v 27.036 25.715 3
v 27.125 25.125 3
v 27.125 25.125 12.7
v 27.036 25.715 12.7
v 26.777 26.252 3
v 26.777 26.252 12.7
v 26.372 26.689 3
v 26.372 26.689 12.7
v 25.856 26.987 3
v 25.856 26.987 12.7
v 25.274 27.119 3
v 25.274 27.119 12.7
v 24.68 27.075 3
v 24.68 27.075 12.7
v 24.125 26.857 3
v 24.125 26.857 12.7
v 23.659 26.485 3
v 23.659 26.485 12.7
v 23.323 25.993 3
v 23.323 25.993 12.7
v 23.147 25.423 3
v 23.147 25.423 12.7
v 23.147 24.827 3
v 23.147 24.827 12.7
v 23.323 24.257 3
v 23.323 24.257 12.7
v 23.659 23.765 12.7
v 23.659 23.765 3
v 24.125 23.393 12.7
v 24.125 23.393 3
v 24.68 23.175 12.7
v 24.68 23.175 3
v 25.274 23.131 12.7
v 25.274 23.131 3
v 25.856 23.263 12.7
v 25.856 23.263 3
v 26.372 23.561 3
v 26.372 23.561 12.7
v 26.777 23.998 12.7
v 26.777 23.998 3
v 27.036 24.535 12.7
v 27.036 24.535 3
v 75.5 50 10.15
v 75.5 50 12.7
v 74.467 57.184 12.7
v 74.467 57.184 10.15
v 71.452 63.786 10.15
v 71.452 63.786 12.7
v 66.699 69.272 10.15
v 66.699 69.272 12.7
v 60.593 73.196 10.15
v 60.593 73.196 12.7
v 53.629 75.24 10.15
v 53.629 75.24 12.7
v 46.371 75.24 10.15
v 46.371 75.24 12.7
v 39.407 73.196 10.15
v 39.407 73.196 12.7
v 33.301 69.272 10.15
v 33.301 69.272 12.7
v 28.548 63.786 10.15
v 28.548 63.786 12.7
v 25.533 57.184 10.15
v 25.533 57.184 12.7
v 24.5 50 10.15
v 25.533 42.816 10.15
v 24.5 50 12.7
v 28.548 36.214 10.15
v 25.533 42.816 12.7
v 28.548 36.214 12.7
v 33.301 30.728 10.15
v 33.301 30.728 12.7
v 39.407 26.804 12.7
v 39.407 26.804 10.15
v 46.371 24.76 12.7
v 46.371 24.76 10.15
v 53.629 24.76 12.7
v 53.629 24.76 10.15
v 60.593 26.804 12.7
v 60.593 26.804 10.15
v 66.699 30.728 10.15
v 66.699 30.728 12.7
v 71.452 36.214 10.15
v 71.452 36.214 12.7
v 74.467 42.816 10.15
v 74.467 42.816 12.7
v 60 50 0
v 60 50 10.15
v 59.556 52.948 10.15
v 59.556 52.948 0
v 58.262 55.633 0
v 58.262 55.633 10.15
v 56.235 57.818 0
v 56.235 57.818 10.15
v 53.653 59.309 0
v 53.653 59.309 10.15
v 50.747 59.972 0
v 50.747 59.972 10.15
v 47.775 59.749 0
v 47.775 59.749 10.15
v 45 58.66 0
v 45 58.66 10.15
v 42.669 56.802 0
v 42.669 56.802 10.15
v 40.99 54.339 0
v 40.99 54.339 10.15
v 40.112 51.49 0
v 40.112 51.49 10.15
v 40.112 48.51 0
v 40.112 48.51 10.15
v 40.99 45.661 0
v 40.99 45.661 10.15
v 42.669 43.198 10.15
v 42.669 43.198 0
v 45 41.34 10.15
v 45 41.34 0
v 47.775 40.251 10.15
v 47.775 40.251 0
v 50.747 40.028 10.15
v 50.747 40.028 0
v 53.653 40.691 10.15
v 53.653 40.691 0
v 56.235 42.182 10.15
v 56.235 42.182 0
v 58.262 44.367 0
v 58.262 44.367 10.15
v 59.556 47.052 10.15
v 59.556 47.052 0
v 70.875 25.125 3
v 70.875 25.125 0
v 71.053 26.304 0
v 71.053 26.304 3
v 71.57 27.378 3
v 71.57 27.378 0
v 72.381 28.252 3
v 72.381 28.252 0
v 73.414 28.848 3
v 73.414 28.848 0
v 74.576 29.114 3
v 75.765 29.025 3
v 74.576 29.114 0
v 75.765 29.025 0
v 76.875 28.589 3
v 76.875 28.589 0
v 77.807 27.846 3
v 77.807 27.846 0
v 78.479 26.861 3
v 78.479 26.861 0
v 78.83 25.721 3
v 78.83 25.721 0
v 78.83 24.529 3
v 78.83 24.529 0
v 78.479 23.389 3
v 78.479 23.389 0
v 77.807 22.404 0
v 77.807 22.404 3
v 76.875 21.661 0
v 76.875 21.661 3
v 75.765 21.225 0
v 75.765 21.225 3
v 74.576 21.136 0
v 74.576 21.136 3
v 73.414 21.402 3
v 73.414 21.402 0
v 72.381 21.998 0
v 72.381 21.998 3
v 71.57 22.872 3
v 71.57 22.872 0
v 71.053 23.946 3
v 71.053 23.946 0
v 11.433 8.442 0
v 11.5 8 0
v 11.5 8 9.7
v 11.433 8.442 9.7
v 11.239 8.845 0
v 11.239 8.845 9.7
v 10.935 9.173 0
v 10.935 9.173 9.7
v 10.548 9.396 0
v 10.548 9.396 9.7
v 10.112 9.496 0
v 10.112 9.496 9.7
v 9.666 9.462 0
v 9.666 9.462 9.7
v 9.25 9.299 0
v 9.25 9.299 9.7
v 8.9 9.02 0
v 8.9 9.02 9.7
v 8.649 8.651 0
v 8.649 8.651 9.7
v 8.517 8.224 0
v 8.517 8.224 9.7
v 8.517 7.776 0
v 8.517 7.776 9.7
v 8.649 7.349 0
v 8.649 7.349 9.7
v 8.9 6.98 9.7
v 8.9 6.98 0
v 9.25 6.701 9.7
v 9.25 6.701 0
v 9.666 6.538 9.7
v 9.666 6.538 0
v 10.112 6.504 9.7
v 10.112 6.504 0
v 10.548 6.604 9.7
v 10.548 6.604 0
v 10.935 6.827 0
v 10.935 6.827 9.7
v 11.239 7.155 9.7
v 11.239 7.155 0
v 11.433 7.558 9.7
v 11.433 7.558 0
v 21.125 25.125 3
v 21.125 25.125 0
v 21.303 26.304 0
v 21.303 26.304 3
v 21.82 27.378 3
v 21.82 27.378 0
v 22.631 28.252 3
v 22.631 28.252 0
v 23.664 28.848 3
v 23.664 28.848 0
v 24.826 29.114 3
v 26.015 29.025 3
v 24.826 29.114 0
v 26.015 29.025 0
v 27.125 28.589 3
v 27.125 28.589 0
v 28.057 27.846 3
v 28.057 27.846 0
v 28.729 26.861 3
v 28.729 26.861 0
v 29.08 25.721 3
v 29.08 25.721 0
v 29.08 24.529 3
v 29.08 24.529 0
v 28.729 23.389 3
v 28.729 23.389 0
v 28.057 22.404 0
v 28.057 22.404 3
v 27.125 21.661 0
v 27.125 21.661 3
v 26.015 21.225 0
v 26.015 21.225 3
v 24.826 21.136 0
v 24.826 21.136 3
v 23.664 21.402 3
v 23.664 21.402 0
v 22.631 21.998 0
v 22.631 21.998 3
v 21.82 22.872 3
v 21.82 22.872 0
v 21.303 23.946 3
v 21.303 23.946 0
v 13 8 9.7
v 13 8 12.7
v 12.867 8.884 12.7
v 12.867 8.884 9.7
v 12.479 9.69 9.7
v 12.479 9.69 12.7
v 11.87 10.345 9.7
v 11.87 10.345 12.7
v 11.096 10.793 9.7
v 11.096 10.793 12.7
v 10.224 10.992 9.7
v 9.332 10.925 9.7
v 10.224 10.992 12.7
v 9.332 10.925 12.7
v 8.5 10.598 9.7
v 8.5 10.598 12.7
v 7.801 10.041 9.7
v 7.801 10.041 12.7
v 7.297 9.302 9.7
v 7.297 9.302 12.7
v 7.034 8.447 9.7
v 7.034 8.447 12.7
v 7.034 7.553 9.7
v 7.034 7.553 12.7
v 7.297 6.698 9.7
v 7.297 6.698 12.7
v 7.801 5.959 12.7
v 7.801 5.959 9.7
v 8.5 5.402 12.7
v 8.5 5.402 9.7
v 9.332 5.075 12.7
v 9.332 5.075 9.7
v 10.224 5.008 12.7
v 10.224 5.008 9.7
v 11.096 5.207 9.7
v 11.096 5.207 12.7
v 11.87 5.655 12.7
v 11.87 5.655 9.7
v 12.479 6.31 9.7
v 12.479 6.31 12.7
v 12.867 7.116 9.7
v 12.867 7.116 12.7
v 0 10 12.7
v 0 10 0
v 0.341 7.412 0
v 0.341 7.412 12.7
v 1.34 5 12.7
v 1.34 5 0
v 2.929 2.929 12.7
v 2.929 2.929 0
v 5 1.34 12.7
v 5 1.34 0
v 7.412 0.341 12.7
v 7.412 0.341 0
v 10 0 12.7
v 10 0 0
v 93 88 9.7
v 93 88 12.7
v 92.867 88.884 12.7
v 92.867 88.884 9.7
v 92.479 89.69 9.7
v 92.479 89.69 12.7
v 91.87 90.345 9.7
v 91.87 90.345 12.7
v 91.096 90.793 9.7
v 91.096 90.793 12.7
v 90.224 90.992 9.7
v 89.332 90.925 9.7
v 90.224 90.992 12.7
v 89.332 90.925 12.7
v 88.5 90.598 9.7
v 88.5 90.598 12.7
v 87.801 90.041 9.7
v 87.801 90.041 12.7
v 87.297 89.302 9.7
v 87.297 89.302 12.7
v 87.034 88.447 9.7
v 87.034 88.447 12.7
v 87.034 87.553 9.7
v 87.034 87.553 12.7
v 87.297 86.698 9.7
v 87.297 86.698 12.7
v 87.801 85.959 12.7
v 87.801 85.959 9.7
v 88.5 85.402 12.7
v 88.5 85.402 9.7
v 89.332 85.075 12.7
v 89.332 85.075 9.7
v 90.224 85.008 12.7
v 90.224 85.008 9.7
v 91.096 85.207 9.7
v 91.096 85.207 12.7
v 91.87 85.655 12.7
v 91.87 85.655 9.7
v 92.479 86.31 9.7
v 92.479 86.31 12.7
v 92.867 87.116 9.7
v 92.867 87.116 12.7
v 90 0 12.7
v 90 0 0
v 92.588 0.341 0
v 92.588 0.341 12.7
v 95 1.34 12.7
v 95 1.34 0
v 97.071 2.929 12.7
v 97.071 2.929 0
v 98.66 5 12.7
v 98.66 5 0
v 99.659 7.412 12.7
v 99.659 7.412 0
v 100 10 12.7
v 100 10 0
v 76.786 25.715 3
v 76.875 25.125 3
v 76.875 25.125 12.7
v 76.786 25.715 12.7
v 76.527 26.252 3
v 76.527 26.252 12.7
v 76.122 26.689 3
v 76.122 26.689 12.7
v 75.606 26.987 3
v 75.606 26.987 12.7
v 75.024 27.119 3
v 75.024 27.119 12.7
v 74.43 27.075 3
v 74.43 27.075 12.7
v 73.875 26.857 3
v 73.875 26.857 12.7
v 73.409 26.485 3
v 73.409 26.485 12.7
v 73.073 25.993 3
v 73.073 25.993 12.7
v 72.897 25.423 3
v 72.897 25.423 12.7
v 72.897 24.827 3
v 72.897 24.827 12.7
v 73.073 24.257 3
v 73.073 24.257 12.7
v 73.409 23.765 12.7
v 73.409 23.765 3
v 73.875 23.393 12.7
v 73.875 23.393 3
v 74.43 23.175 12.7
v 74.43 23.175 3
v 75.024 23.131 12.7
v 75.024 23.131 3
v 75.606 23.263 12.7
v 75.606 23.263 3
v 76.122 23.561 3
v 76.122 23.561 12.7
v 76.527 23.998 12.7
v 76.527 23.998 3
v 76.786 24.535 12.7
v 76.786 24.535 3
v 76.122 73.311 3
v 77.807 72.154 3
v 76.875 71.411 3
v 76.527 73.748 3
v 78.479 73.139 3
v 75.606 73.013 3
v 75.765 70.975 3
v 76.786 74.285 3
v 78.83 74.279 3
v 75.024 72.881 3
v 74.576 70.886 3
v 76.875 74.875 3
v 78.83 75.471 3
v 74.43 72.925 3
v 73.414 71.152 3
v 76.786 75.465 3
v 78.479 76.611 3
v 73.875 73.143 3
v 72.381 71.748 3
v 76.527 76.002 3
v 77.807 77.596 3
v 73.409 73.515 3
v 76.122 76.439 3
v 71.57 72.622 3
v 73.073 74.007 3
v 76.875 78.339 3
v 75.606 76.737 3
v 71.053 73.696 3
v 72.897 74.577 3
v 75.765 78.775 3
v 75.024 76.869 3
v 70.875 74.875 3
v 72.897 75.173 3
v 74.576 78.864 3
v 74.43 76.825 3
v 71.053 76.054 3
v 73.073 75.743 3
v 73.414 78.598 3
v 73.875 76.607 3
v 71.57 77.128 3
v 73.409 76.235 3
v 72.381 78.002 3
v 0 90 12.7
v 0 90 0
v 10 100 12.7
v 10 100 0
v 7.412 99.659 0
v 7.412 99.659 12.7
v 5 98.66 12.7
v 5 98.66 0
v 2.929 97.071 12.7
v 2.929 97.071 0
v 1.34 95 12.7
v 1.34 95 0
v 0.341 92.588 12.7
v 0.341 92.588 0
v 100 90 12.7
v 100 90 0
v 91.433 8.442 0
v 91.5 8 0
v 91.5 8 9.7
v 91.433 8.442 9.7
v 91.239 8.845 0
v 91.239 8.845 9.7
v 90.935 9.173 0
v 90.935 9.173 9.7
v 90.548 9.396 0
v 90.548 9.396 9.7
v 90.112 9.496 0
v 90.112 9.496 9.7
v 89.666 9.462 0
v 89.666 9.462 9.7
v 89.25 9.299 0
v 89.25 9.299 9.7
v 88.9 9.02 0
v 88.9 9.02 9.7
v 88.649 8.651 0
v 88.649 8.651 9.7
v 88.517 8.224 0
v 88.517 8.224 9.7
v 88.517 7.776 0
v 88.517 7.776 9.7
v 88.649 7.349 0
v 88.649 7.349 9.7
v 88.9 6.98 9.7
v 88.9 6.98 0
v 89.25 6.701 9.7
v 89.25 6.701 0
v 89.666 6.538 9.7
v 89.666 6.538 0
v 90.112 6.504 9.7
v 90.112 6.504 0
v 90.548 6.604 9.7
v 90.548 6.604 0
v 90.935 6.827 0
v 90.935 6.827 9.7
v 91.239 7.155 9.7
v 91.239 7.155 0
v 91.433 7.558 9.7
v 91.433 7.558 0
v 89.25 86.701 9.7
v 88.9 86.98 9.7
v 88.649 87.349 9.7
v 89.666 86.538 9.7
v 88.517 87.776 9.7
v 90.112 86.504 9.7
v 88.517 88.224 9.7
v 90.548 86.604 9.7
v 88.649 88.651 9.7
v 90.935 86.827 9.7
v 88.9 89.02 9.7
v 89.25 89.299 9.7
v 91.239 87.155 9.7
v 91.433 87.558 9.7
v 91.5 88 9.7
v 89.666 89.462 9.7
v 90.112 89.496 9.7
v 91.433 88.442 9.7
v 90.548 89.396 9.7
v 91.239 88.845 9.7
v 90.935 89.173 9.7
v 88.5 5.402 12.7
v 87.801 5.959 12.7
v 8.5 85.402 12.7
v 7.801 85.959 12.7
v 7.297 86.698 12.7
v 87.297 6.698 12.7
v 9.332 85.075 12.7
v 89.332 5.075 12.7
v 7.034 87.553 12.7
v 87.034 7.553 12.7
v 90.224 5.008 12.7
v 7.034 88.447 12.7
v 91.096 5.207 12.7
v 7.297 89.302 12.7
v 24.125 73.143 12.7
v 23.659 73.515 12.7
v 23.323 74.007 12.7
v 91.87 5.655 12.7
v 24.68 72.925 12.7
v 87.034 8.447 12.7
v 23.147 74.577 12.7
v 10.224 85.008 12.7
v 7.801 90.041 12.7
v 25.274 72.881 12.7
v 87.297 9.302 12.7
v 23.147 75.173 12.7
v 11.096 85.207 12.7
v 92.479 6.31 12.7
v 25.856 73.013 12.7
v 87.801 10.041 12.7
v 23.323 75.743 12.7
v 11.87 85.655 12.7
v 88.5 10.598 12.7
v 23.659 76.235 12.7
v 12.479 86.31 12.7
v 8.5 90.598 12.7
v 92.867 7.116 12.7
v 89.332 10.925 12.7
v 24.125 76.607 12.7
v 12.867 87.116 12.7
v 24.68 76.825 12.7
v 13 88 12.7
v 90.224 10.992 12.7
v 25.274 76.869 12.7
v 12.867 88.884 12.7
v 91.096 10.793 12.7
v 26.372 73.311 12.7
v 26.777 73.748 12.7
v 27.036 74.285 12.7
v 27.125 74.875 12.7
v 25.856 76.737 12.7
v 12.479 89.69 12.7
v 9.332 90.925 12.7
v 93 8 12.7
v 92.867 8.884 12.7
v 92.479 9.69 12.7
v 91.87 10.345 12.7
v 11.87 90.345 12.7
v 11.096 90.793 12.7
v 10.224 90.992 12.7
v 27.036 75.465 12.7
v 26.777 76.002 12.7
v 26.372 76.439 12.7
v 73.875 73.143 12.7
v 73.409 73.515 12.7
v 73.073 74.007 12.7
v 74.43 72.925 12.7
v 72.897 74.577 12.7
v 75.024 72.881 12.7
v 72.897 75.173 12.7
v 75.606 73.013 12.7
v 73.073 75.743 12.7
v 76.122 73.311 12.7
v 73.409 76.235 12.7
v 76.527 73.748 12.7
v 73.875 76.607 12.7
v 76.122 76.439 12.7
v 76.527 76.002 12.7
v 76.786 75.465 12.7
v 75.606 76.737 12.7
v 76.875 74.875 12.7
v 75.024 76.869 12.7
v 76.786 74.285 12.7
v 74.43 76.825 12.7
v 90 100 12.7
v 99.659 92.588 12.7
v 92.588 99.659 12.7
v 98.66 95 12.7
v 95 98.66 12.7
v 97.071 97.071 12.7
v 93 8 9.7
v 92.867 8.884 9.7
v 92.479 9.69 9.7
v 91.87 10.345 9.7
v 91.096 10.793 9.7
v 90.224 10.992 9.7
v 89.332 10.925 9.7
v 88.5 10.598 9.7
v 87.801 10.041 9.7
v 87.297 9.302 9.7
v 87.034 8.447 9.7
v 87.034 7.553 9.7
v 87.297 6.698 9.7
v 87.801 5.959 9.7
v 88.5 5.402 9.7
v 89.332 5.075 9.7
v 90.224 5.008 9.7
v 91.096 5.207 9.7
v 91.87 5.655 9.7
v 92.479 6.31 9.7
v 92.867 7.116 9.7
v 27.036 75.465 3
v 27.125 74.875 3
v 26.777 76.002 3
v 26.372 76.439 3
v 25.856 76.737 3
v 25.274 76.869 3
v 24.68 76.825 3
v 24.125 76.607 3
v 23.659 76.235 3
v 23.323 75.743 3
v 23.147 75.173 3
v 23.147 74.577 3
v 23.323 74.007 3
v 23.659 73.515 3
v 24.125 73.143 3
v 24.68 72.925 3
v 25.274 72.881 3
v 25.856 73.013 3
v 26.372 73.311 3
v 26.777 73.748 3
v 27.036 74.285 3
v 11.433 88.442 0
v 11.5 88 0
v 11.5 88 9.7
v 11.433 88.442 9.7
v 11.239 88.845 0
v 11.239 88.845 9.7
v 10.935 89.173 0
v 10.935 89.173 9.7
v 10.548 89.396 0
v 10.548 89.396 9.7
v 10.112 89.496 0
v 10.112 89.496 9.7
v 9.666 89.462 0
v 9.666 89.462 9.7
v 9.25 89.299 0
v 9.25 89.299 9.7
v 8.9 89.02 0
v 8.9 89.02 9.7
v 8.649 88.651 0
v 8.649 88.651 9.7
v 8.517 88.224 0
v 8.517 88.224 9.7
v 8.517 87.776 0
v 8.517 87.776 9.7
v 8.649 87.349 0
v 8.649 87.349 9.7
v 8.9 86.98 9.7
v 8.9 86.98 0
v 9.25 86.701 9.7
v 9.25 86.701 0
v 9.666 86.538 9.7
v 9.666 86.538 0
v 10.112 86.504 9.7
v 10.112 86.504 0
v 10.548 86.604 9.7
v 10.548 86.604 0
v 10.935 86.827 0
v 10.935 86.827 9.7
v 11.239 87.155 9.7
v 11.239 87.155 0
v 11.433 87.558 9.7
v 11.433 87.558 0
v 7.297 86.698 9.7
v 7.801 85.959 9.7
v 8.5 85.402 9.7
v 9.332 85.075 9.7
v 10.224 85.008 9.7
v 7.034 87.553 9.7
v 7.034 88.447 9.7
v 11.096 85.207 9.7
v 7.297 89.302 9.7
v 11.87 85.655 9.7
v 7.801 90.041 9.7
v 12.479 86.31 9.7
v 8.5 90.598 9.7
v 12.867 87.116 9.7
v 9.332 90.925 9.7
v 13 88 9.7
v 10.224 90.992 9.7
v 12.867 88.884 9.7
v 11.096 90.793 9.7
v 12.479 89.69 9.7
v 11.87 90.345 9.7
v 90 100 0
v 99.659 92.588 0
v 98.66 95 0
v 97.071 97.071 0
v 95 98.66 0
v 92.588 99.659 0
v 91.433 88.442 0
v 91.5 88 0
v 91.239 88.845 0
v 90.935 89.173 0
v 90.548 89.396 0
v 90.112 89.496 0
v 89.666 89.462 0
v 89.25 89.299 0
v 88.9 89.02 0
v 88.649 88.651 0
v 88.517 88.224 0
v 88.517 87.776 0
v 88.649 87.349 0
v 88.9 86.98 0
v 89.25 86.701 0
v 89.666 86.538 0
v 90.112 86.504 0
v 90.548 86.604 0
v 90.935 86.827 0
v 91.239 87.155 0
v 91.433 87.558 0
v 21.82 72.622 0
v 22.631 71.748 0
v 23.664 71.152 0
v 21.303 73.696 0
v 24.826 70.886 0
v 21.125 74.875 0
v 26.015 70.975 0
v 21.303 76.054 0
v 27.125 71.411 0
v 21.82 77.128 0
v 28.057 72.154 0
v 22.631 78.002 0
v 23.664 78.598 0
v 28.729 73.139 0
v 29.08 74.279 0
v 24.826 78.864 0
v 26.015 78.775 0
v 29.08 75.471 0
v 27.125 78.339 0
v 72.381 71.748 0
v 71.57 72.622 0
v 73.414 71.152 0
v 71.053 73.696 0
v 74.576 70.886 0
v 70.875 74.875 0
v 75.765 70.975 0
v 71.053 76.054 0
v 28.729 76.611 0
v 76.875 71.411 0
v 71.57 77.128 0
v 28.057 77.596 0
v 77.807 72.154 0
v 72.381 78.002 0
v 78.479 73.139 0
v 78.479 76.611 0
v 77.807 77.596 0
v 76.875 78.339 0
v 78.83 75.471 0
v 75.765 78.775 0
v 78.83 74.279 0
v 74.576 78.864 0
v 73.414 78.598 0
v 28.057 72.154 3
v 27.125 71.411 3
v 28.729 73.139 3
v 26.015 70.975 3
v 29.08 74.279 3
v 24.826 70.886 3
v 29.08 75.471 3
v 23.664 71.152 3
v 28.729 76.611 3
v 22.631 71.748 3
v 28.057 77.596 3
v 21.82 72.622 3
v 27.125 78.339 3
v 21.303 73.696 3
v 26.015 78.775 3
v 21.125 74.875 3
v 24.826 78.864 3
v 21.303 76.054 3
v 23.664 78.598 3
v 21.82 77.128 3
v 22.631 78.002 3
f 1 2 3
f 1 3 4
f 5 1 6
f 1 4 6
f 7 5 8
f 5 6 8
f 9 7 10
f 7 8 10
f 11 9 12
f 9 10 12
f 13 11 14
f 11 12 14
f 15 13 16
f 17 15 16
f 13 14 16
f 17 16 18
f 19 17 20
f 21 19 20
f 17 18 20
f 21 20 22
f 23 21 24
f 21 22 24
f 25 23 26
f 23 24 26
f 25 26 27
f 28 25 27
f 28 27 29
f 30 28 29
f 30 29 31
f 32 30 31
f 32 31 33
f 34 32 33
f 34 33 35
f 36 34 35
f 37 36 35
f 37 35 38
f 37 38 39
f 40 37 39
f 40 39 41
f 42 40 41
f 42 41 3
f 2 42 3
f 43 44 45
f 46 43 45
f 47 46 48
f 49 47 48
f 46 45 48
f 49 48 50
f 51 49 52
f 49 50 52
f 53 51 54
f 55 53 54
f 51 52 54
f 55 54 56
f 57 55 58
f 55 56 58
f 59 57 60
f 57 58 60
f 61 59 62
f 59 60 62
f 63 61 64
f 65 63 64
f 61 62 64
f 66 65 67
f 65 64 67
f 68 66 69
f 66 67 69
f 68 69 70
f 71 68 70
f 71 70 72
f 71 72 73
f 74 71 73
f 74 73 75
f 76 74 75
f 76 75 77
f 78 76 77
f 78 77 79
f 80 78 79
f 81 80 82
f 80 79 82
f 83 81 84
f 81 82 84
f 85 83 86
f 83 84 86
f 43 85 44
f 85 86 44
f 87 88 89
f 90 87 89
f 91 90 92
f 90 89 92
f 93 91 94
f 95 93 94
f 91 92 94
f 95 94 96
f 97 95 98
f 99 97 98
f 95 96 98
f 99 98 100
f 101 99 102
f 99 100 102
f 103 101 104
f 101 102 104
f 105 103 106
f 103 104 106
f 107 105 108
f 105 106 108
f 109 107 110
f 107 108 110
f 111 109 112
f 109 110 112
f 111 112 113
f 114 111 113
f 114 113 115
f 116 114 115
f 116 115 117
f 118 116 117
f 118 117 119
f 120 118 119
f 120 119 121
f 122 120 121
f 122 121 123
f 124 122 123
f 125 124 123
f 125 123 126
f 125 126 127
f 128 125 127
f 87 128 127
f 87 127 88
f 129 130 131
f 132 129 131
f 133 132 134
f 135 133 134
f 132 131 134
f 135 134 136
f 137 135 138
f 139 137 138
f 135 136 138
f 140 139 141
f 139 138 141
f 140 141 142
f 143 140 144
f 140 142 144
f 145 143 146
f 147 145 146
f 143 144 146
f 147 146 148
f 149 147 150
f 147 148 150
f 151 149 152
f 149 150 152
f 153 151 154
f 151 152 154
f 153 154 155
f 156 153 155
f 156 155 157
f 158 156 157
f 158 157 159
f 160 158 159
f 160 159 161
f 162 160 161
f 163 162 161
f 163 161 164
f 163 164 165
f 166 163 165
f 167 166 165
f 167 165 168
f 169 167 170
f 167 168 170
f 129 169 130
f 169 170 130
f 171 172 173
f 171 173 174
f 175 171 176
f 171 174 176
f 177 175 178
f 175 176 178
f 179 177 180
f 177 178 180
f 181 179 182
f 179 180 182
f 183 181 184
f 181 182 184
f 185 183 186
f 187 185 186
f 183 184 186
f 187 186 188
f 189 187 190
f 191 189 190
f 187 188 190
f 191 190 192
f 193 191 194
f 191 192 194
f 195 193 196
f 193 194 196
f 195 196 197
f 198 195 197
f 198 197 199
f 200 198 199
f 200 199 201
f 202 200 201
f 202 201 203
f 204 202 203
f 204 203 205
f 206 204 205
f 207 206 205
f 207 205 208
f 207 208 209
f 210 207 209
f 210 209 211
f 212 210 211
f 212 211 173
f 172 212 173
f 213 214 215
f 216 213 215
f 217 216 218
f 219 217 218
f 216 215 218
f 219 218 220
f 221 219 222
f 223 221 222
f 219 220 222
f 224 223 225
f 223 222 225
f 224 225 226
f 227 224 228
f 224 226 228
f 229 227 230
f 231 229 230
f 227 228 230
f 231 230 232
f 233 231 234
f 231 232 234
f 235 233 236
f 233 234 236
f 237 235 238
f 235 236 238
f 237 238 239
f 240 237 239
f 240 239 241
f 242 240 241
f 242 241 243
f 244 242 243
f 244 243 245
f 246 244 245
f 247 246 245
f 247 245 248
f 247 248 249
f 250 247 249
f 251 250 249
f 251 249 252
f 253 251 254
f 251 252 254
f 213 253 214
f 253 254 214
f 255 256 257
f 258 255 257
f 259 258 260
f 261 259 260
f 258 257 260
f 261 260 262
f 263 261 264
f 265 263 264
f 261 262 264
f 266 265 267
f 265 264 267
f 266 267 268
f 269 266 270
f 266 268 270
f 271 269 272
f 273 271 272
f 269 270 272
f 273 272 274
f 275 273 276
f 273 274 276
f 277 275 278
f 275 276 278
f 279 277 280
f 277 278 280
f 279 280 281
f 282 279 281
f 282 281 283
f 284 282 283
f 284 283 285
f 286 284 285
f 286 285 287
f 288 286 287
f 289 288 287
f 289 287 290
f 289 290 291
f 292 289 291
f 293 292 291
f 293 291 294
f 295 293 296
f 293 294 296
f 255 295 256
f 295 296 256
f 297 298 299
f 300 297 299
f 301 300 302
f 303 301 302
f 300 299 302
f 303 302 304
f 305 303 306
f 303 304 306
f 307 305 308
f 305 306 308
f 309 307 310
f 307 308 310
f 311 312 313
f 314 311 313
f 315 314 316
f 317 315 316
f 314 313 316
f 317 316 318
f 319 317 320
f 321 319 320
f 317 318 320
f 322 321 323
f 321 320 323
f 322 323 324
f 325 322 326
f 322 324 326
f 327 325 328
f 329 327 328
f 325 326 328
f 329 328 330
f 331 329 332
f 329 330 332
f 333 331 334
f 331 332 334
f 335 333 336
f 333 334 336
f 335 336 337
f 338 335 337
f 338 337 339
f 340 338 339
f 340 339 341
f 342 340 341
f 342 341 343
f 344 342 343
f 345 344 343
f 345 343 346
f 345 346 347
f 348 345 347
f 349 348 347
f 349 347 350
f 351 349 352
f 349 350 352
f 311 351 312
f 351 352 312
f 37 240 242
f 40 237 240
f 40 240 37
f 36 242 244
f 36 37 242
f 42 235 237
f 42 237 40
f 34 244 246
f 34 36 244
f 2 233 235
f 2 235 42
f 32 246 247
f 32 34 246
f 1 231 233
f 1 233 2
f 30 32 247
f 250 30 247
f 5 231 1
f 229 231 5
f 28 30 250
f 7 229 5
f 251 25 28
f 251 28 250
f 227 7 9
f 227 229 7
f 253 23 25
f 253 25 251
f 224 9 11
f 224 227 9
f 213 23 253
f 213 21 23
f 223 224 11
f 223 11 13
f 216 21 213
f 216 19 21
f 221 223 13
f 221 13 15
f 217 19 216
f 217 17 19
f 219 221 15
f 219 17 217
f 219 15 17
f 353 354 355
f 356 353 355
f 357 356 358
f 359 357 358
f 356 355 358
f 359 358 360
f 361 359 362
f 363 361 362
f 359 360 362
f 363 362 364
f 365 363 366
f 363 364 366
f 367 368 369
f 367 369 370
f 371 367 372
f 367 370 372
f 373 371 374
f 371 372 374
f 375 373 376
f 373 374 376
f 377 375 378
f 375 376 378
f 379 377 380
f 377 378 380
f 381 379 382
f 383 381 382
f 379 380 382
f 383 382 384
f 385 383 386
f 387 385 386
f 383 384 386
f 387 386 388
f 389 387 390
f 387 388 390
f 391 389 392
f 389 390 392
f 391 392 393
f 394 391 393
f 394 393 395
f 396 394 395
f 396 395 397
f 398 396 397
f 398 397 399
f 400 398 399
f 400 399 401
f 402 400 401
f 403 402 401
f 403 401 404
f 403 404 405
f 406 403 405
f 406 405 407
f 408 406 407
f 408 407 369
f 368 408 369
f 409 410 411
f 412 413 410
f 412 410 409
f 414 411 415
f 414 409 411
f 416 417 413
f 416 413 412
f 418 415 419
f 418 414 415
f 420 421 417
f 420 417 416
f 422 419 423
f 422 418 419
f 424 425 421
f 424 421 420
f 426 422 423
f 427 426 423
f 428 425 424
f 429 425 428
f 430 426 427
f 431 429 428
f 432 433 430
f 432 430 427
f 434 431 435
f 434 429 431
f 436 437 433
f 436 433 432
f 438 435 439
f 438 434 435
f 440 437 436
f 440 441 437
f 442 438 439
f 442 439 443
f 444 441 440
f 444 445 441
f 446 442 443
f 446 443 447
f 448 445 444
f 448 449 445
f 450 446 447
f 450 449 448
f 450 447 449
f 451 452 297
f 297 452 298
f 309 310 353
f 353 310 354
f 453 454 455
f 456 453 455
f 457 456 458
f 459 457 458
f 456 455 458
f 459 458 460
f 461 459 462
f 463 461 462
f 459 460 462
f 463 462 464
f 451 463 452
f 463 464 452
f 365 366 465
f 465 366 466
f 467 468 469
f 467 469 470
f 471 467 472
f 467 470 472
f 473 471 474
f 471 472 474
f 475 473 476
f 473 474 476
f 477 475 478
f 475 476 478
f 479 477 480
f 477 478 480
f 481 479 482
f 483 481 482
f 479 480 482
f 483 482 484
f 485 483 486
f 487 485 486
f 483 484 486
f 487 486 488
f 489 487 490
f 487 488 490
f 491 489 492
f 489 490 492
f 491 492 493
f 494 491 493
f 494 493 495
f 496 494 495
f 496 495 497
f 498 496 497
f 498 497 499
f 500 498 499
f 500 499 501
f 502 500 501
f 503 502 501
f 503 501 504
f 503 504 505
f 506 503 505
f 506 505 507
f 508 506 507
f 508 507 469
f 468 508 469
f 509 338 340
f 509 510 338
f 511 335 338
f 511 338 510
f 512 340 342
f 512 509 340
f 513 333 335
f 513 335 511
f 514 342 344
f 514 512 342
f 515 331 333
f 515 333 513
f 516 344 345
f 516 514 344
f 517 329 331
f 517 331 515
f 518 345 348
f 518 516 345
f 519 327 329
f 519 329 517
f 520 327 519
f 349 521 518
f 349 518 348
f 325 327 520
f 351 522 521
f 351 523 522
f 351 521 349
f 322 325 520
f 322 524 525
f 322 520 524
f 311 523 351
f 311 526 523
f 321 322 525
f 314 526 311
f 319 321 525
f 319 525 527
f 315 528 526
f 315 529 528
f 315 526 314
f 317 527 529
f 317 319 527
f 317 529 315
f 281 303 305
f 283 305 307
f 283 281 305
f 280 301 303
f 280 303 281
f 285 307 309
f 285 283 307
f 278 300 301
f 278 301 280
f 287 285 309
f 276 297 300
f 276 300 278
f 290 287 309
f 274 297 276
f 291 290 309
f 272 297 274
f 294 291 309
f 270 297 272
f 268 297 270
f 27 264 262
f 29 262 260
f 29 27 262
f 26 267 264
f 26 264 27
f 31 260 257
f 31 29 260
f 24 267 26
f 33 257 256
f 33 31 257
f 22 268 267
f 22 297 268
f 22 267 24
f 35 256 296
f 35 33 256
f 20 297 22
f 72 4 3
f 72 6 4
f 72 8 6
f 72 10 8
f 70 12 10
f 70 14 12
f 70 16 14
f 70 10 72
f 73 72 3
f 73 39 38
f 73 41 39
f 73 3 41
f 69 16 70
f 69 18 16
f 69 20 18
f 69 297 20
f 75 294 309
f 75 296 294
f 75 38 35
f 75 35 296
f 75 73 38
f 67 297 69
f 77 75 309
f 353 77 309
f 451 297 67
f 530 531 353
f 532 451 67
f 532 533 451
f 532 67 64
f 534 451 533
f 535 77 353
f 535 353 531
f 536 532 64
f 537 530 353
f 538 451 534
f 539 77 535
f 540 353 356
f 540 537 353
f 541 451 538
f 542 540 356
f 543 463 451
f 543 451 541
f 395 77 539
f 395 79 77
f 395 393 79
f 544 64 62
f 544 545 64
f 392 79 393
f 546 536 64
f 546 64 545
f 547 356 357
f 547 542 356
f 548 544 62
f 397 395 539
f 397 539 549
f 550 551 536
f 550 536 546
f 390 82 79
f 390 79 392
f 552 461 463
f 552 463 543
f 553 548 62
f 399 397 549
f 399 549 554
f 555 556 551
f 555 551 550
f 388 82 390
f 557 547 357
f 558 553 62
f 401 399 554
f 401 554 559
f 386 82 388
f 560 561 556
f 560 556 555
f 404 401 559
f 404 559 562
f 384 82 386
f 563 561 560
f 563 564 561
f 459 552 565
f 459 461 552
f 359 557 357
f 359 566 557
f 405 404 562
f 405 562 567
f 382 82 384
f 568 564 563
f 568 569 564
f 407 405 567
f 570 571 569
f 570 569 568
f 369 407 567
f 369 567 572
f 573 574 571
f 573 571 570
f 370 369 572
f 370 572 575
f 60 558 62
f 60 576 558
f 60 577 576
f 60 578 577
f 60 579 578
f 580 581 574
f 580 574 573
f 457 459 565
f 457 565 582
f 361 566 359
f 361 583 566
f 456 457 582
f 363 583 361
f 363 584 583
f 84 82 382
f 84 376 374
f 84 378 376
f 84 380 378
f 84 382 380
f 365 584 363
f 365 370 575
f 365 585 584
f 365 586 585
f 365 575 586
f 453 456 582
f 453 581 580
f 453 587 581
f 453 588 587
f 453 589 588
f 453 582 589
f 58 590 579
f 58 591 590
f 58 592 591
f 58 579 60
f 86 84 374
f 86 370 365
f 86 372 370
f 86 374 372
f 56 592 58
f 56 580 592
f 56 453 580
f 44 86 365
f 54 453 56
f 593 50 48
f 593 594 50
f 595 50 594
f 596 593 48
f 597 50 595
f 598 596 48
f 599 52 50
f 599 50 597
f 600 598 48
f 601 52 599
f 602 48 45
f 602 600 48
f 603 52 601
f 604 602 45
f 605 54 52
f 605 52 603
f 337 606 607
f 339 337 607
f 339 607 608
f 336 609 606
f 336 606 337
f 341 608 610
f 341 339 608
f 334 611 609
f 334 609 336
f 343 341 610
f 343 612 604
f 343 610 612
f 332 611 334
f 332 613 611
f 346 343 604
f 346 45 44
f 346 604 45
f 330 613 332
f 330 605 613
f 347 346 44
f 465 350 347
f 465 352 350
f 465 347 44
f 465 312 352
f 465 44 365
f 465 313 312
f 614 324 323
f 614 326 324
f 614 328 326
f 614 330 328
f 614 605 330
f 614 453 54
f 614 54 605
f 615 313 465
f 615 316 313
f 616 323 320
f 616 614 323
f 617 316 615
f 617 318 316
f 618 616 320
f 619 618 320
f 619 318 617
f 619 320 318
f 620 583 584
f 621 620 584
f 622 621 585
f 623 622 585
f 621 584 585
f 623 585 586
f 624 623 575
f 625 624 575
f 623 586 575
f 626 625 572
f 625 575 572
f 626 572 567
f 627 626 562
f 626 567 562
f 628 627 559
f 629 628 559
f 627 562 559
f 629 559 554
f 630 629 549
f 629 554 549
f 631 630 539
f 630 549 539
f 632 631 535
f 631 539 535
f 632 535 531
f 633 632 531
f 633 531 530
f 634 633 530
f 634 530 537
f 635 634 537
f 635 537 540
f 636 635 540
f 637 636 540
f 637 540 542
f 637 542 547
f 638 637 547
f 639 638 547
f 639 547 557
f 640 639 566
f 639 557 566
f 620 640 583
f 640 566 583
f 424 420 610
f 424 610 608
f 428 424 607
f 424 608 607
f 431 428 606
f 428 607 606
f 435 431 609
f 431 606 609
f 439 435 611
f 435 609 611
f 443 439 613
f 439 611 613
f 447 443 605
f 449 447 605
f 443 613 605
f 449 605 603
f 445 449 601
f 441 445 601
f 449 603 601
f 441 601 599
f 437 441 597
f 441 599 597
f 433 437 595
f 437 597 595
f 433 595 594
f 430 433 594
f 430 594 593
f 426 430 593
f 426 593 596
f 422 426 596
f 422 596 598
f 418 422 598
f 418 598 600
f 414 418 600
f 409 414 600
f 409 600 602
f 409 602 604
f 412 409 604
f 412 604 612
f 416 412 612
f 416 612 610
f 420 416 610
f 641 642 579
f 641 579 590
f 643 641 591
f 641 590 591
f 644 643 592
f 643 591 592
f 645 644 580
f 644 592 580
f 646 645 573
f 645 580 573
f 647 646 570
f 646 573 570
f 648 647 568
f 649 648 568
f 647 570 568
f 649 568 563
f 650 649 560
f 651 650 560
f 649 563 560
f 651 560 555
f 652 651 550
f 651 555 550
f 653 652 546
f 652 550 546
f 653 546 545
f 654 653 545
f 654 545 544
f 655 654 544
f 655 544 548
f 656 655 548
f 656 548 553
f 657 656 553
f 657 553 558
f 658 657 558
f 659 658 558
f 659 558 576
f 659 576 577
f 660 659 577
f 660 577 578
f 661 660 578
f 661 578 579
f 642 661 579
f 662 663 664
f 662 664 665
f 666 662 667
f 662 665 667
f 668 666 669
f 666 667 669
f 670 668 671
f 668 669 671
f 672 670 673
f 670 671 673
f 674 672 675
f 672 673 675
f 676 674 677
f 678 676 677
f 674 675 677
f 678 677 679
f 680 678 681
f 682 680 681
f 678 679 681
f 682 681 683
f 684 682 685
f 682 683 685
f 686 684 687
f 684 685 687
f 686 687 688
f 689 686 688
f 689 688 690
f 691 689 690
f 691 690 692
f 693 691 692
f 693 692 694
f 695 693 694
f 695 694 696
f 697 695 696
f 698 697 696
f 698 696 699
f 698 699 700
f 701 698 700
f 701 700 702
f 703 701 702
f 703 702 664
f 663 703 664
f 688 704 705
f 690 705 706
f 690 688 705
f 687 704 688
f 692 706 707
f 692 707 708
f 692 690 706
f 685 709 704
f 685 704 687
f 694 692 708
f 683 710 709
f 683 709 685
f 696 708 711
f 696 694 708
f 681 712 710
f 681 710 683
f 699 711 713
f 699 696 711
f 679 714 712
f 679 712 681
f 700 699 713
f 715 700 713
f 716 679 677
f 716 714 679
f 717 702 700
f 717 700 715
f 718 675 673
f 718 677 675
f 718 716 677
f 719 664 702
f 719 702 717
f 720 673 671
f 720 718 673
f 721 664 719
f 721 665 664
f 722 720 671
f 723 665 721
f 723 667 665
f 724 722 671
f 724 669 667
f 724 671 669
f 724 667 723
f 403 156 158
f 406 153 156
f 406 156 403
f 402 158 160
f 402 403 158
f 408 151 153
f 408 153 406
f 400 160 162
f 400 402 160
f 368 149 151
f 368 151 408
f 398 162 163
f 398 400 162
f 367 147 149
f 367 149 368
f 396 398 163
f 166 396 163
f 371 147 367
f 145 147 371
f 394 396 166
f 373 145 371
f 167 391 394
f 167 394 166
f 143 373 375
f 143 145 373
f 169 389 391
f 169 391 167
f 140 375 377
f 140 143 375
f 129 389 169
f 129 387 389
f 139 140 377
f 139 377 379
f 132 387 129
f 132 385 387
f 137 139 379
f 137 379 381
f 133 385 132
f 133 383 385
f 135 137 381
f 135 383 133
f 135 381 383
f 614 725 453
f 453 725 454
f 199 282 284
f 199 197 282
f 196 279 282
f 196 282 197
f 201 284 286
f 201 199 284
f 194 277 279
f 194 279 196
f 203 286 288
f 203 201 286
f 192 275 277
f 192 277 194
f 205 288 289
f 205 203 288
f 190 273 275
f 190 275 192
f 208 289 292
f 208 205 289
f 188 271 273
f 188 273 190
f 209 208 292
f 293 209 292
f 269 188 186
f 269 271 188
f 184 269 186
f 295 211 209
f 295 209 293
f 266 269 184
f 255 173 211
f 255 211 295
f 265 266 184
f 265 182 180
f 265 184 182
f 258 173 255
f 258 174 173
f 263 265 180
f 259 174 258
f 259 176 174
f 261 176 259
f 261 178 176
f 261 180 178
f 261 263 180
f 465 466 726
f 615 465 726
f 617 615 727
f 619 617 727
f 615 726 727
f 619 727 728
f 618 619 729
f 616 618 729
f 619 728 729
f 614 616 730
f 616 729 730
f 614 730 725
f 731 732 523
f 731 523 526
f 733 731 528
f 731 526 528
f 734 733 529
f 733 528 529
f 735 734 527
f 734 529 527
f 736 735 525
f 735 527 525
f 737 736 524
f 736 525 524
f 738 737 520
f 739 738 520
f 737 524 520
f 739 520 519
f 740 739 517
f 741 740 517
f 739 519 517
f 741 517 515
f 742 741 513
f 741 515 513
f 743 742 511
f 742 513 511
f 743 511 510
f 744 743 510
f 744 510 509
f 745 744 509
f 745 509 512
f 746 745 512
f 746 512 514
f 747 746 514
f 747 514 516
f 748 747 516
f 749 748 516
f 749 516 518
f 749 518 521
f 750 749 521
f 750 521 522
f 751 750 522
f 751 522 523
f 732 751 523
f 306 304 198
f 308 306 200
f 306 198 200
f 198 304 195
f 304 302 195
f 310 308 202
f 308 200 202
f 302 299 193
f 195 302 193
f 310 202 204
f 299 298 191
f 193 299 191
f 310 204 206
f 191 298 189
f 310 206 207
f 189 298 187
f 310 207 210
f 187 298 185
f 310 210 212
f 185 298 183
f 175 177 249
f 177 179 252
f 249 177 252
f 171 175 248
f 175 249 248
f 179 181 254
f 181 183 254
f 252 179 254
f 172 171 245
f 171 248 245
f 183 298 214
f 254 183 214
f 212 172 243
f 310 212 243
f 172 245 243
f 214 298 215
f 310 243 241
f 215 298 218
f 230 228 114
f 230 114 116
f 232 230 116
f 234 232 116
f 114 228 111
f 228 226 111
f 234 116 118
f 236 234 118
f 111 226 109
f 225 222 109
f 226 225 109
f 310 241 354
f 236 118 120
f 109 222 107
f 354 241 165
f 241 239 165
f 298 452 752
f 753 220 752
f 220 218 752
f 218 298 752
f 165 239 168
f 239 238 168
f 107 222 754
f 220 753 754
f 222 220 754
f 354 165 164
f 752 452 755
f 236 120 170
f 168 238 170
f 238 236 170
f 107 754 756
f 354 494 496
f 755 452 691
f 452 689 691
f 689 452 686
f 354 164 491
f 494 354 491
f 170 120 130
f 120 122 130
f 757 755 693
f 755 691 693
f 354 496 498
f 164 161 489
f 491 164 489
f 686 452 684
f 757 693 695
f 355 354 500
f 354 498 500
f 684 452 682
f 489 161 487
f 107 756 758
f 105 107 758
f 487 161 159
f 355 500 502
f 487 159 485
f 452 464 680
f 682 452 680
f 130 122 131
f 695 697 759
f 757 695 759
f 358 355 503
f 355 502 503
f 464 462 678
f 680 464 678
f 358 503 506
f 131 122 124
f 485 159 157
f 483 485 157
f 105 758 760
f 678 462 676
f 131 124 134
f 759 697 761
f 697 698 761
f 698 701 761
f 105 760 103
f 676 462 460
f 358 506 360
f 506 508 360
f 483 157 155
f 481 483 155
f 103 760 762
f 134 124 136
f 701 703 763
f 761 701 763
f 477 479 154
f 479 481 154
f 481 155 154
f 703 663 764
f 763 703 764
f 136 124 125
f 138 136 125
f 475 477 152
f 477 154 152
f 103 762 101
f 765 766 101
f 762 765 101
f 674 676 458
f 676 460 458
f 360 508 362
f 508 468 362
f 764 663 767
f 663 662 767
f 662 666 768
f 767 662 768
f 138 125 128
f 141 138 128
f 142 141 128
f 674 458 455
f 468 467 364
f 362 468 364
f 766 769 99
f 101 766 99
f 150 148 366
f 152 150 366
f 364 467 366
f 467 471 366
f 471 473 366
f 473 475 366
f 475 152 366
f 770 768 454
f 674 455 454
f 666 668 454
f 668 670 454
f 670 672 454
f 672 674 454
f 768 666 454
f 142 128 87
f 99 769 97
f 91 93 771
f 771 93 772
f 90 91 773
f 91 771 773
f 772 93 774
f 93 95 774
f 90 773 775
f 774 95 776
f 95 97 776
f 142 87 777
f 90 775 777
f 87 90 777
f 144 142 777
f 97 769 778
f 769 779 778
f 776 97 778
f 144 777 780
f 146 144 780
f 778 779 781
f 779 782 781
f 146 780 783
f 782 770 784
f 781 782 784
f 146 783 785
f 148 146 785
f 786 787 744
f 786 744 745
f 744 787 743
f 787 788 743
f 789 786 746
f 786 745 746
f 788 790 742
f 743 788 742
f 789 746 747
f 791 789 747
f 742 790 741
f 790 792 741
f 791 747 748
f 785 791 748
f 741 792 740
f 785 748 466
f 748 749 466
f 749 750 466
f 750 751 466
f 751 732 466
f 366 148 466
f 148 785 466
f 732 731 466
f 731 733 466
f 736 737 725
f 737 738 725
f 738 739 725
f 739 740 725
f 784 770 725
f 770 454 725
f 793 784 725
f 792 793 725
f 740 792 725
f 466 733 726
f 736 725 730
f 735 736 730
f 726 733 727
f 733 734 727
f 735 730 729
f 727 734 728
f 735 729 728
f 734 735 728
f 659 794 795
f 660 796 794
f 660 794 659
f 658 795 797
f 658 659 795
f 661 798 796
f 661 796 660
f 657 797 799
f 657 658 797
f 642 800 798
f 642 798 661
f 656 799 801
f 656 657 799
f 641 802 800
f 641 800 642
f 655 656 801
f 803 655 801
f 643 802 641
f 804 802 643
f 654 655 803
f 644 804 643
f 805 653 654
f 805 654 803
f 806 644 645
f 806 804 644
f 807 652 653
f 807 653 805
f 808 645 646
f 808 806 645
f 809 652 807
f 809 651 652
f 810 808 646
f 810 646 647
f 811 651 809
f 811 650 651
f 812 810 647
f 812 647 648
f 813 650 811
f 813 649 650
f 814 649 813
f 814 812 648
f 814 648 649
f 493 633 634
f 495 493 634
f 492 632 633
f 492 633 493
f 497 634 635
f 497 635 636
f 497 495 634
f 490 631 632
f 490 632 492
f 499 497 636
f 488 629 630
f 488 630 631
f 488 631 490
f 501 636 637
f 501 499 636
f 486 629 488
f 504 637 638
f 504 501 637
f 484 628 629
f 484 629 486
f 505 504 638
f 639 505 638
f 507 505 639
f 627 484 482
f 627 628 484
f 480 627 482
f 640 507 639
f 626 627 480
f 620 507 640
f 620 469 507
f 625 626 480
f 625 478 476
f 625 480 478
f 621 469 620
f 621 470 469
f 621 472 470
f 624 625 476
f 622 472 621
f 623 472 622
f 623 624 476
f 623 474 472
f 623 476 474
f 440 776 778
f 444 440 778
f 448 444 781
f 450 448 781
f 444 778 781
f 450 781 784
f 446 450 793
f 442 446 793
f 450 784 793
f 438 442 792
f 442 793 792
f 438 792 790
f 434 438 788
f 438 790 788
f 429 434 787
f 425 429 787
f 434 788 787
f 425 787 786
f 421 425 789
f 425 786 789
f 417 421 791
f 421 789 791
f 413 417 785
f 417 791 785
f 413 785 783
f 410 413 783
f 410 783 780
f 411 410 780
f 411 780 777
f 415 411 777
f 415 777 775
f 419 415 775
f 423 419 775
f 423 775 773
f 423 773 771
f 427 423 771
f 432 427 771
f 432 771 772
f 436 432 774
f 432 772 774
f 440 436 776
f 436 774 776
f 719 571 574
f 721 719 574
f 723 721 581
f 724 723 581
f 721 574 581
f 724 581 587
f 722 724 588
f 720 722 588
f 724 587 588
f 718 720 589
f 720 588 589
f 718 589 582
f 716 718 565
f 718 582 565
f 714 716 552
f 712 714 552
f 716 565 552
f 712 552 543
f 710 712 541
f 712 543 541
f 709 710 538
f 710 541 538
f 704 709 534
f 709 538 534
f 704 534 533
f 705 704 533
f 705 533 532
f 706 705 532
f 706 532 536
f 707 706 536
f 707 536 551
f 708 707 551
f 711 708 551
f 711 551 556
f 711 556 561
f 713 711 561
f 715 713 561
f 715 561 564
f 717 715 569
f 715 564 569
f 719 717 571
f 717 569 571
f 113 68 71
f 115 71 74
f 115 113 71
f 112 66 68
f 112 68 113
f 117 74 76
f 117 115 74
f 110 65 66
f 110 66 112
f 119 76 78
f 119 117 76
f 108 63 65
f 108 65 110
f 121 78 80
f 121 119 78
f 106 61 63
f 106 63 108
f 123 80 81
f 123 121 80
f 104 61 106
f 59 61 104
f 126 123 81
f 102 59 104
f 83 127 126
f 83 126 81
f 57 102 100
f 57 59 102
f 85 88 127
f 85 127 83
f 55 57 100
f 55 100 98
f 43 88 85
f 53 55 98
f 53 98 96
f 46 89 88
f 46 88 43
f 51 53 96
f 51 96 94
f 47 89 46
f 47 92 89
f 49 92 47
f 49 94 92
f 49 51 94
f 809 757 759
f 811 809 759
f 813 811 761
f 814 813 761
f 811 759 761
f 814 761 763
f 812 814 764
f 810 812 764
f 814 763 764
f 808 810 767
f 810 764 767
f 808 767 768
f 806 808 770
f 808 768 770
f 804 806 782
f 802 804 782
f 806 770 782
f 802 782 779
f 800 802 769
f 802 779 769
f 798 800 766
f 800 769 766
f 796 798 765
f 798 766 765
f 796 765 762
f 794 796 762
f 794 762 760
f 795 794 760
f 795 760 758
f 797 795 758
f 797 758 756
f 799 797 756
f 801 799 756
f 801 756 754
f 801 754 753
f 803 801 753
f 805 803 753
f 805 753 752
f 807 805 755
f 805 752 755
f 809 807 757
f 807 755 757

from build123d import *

# Parameters (mm, degrees)
SALIENTE_EXTRUIR1_DEPTH = 12.7
CROQUIS2_R              = 3
CORTAR_EXTRUIR1_DEPTH   = 3
CROQUIS3_R              = 10
CROQUIS3_R_2            = 2
CORTAR_EXTRUIR2_DEPTH   = 31
CROQUIS4_R              = 1.5
CORTAR_EXTRUIR3_DEPTH   = 31
CROQUIS5_R              = 4
CORTAR_EXTRUIR4_DEPTH   = 3
CROQUIS6_R              = 25.5
CORTAR_EXTRUIR5_DEPTH   = 2.55


with BuildPart() as part:
    # Croquis1 → Saliente-Extruir1 (new body)
    with BuildSketch(Plane.XY):
        with BuildLine():
            Line((10, 0), (90, 0))
            ThreePointArc((90, 0), (97.071067812, 2.928932188), (100, 10))
            Line((100, 10), (100, 90))
            ThreePointArc((100, 90), (97.071067812, 97.071067812), (90, 100))
            Line((90, 100), (10, 100))
            ThreePointArc((10, 100), (2.928932188, 97.071067812), (0, 90))
            Line((0, 90), (0, 10))
            ThreePointArc((0, 10), (2.928932188, 2.928932188), (10, 0))
        make_face()
    extrude(amount=SALIENTE_EXTRUIR1_DEPTH)

    # Croquis2 → Cortar-Extruir1 (cut)
    with BuildSketch(Plane.XY.offset(12.7)):
        with Locations((10, 88)):
            Circle(CROQUIS2_R)
        with Locations((10, 8)):
            Circle(CROQUIS2_R)
        with Locations((90, 88)):
            Circle(CROQUIS2_R)
        with Locations((90, 8)):
            Circle(CROQUIS2_R)
    extrude(amount=-CORTAR_EXTRUIR1_DEPTH, mode=Mode.SUBTRACT)

    # Croquis3 → Cortar-Extruir2 (cut)
    with BuildSketch(Plane.XY.offset(12.7)):
        with Locations((50, 50)):
            Circle(CROQUIS3_R)
        with Locations((25.125, 74.875)):
            Circle(CROQUIS3_R_2)
        with Locations((74.875, 74.875)):
            Circle(CROQUIS3_R_2)
        with Locations((25.125, 25.125)):
            Circle(CROQUIS3_R_2)
        with Locations((74.875, 25.125)):
            Circle(CROQUIS3_R_2)
    extrude(amount=-CORTAR_EXTRUIR2_DEPTH, mode=Mode.SUBTRACT)

    # Croquis4 → Cortar-Extruir3 (cut)
    with BuildSketch(Plane.XY.offset(9.7)):
        with Locations((10, 88)):
            Circle(CROQUIS4_R)
        with Locations((90, 88)):
            Circle(CROQUIS4_R)
        with Locations((90, 8)):
            Circle(CROQUIS4_R)
        with Locations((10, 8)):
            Circle(CROQUIS4_R)
    extrude(amount=-CORTAR_EXTRUIR3_DEPTH, mode=Mode.SUBTRACT)

    # Croquis5 → Cortar-Extruir4 (cut)
    with BuildSketch(Plane(origin=(0, 0, 0), x_dir=(-1, 0, 0), z_dir=(0, 0, -1))):
        with Locations((-74.875, 74.875)):
            Circle(CROQUIS5_R)
        with Locations((-25.125, 74.875)):
            Circle(CROQUIS5_R)
        with Locations((-25.125, 25.125)):
            Circle(CROQUIS5_R)
        with Locations((-74.875, 25.125)):
            Circle(CROQUIS5_R)
    extrude(amount=-CORTAR_EXTRUIR4_DEPTH, mode=Mode.SUBTRACT)

    # Croquis6 → Cortar-Extruir5 (cut)
    with BuildSketch(Plane.XY.offset(12.7)):
        with Locations((50, 50)):
            Circle(CROQUIS6_R)
    extrude(amount=-CORTAR_EXTRUIR5_DEPTH, mode=Mode.SUBTRACT)


solid = part.part
